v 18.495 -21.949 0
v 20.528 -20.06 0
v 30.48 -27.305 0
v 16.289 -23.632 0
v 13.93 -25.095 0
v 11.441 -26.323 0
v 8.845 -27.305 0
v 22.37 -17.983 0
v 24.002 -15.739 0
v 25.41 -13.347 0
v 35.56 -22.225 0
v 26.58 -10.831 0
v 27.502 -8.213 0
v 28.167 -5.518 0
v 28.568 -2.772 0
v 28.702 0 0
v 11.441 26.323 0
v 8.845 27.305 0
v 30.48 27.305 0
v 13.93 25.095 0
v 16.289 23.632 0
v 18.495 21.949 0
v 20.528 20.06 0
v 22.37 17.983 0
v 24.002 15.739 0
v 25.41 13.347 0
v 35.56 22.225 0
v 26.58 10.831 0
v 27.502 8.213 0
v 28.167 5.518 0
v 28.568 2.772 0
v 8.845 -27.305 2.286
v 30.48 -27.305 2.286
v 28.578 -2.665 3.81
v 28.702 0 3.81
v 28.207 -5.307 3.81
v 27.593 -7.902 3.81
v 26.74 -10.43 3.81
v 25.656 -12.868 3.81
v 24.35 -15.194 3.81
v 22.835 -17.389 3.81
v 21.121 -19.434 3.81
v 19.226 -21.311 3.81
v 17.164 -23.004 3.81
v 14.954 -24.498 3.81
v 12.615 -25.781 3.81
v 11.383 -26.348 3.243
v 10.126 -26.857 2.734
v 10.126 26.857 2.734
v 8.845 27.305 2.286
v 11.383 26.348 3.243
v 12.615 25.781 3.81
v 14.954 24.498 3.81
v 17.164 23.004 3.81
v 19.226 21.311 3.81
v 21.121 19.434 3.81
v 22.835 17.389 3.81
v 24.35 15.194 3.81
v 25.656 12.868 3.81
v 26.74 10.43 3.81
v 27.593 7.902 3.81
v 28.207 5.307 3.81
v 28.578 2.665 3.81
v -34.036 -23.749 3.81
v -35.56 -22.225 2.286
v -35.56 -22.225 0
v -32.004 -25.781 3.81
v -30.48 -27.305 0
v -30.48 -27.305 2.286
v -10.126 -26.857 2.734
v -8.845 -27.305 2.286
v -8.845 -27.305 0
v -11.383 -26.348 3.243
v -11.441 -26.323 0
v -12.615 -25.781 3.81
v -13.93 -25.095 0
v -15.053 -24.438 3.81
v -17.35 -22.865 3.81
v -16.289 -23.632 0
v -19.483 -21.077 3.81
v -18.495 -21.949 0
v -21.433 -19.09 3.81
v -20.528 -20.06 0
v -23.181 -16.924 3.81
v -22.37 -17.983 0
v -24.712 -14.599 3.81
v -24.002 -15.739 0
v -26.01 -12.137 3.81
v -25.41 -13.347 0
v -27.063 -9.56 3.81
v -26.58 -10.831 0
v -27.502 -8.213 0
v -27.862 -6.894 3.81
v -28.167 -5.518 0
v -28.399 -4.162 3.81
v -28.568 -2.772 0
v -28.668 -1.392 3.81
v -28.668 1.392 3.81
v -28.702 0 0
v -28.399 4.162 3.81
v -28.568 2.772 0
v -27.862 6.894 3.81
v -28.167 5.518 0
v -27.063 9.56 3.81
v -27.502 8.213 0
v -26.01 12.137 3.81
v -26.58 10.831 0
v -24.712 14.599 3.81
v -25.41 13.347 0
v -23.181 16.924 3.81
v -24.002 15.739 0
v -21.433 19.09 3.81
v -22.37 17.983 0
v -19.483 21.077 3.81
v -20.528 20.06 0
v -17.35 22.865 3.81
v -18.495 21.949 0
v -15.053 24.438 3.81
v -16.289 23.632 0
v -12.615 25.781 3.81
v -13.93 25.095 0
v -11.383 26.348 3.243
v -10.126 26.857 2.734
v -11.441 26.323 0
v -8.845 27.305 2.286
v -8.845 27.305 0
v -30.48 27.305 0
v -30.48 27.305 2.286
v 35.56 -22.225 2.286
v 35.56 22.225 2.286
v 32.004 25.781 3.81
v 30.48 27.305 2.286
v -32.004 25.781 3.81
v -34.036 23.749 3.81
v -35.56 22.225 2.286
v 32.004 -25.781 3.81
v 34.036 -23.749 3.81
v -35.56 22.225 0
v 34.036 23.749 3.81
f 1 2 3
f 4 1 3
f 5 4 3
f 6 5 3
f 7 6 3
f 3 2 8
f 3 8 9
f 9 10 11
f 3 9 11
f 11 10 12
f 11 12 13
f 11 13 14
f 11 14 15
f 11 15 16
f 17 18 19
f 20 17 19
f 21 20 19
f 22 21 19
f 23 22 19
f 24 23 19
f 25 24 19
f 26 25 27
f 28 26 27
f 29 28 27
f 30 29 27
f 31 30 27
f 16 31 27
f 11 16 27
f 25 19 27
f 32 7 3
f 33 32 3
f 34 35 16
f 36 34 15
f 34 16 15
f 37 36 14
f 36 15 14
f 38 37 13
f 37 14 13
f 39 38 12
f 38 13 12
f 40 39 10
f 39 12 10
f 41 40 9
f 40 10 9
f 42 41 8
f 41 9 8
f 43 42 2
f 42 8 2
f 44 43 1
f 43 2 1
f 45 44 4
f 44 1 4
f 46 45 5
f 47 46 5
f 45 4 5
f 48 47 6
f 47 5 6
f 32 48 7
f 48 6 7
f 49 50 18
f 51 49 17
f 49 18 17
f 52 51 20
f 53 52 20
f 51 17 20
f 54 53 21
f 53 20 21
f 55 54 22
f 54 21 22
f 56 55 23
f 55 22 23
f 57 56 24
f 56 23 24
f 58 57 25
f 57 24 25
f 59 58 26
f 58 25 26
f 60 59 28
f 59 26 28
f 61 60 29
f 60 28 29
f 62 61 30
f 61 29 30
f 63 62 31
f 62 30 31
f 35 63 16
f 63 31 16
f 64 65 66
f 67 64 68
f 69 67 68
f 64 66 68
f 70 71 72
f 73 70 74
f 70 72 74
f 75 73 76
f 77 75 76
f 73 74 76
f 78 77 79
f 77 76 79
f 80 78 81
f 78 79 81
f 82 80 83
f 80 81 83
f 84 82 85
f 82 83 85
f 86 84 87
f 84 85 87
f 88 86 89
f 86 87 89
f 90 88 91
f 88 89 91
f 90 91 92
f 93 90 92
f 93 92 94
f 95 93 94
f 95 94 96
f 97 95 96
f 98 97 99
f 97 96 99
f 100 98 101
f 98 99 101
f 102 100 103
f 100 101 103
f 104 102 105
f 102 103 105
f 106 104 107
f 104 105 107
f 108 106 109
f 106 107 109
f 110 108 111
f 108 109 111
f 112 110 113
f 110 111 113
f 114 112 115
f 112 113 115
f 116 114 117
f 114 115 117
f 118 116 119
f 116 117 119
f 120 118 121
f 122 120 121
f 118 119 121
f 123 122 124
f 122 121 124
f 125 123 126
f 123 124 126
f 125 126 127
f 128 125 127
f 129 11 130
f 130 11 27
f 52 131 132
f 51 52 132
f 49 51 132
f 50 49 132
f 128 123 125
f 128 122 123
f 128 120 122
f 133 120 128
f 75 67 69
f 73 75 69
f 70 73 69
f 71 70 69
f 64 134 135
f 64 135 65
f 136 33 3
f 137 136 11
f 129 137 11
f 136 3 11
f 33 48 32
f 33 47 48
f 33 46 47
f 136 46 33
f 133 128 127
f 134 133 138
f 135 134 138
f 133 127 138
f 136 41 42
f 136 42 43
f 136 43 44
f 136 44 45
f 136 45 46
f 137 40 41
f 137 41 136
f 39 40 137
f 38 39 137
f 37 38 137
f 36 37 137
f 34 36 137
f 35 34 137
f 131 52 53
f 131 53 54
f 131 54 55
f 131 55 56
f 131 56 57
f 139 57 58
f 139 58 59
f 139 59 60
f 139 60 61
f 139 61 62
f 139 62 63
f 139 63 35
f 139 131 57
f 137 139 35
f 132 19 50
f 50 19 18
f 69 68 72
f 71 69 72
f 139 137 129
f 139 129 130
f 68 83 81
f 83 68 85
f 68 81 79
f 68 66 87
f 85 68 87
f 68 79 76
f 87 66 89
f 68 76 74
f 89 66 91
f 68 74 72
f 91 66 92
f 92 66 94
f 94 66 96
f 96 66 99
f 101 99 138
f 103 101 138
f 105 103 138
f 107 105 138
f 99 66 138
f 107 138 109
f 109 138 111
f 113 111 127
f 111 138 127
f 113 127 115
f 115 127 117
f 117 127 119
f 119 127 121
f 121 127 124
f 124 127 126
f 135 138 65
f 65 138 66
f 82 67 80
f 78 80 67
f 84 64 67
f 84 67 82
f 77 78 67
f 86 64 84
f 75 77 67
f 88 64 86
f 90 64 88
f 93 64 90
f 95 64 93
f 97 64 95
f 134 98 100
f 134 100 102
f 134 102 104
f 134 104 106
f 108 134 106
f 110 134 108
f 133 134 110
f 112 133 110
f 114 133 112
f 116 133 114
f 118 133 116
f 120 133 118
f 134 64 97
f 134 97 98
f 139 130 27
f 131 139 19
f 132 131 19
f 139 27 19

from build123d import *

# Parameters (mm, degrees)
F1_DEPTH      = 3.81
F2_SIZE       = 1.524
F2_2_SIZE     = 1.524
F3_T1_DEPTH   = 28.4142991577
F3_2_T1_DEPTH = 28.4142991577


# Not quite as in the source:
# - a fillet or chamfer that OpenCascade refuses, or shapes differently, is made with other operations: its cross-section is extruded or revolved along the edge and cut away or added


with BuildPart() as f1:
    # F0 (on Top) → F1 (new body)
    with BuildSketch(Plane.XY):
        with BuildLine():
            Line((-8.8454383159, 27.305), (-35.56, 27.305))
            Line((-35.56, 27.305), (-35.56, -27.305))
            Line((-35.56, -27.305), (-8.8454383159, -27.305))
            ThreePointArc((-8.8454383159, -27.305), (-28.702, 0), (-8.8454383159, 27.305))
        make_face()
    extrude(amount=F1_DEPTH)

    # F2
    f2_edges = [f1.edges().sort_by_distance(p)[0] for p in [
        (-35.56, 0, 3.81),
        (-22.202719, 27.305, 3.81),
        (-22.202719, -27.305, 3.81),
    ]]
    chamfer(f2_edges, length=F2_SIZE)

    # F3#2: chamfer of 5.08 on 2 edges, made by hand

    # F3_2_s2 → F3_2_t1 (cut)
    with BuildSketch(Plane.XY.offset(-13.0641495789)):
        Polygon((-35.56, -22.225), (-30.48, -27.305), (-35.56, -27.305), align=None)
        Polygon((-30.48, 27.305), (-35.56, 22.225), (-35.56, 27.305), align=None)
    extrude(amount=F3_2_T1_DEPTH, mode=Mode.SUBTRACT)


with BuildPart() as f1b:
    # F0 (on Top) → F1, piece 2 (new body)
    with BuildSketch(Plane.XY):
        with BuildLine():
            Line((35.56, 27.305), (8.8454383159, 27.305))
            ThreePointArc((8.8454383159, 27.305), (23.2129982396, 16.8808032015), (28.702, 0))
            ThreePointArc((28.702, 0), (23.2129982396, -16.8808032015), (8.8454383159, -27.305))
            Line((8.8454383159, -27.305), (35.56, -27.305))
            Line((35.56, -27.305), (35.56, 27.305))
        make_face()
    extrude(amount=F1_DEPTH)

    # F2#2
    f2_2_edges = [f1b.edges().sort_by_distance(p)[0] for p in [
        (22.202719, -27.305, 3.81),
        (35.56, 0, 3.81),
        (22.202719, 27.305, 3.81),
    ]]
    chamfer(f2_2_edges, length=F2_2_SIZE)

    # F3: chamfer of 5.08 on 2 edges, made by hand

    # F3_s2 → F3_t1 (cut)
    with BuildSketch(Plane.XY.offset(-13.0641495789)):
        Polygon((30.48, -27.305), (35.56, -22.225), (35.56, -27.305), align=None)
        Polygon((35.56, 22.225), (30.48, 27.305), (35.56, 27.305), align=None)
    extrude(amount=F3_T1_DEPTH, mode=Mode.SUBTRACT)


solid = Compound([f1.part, f1b.part])
